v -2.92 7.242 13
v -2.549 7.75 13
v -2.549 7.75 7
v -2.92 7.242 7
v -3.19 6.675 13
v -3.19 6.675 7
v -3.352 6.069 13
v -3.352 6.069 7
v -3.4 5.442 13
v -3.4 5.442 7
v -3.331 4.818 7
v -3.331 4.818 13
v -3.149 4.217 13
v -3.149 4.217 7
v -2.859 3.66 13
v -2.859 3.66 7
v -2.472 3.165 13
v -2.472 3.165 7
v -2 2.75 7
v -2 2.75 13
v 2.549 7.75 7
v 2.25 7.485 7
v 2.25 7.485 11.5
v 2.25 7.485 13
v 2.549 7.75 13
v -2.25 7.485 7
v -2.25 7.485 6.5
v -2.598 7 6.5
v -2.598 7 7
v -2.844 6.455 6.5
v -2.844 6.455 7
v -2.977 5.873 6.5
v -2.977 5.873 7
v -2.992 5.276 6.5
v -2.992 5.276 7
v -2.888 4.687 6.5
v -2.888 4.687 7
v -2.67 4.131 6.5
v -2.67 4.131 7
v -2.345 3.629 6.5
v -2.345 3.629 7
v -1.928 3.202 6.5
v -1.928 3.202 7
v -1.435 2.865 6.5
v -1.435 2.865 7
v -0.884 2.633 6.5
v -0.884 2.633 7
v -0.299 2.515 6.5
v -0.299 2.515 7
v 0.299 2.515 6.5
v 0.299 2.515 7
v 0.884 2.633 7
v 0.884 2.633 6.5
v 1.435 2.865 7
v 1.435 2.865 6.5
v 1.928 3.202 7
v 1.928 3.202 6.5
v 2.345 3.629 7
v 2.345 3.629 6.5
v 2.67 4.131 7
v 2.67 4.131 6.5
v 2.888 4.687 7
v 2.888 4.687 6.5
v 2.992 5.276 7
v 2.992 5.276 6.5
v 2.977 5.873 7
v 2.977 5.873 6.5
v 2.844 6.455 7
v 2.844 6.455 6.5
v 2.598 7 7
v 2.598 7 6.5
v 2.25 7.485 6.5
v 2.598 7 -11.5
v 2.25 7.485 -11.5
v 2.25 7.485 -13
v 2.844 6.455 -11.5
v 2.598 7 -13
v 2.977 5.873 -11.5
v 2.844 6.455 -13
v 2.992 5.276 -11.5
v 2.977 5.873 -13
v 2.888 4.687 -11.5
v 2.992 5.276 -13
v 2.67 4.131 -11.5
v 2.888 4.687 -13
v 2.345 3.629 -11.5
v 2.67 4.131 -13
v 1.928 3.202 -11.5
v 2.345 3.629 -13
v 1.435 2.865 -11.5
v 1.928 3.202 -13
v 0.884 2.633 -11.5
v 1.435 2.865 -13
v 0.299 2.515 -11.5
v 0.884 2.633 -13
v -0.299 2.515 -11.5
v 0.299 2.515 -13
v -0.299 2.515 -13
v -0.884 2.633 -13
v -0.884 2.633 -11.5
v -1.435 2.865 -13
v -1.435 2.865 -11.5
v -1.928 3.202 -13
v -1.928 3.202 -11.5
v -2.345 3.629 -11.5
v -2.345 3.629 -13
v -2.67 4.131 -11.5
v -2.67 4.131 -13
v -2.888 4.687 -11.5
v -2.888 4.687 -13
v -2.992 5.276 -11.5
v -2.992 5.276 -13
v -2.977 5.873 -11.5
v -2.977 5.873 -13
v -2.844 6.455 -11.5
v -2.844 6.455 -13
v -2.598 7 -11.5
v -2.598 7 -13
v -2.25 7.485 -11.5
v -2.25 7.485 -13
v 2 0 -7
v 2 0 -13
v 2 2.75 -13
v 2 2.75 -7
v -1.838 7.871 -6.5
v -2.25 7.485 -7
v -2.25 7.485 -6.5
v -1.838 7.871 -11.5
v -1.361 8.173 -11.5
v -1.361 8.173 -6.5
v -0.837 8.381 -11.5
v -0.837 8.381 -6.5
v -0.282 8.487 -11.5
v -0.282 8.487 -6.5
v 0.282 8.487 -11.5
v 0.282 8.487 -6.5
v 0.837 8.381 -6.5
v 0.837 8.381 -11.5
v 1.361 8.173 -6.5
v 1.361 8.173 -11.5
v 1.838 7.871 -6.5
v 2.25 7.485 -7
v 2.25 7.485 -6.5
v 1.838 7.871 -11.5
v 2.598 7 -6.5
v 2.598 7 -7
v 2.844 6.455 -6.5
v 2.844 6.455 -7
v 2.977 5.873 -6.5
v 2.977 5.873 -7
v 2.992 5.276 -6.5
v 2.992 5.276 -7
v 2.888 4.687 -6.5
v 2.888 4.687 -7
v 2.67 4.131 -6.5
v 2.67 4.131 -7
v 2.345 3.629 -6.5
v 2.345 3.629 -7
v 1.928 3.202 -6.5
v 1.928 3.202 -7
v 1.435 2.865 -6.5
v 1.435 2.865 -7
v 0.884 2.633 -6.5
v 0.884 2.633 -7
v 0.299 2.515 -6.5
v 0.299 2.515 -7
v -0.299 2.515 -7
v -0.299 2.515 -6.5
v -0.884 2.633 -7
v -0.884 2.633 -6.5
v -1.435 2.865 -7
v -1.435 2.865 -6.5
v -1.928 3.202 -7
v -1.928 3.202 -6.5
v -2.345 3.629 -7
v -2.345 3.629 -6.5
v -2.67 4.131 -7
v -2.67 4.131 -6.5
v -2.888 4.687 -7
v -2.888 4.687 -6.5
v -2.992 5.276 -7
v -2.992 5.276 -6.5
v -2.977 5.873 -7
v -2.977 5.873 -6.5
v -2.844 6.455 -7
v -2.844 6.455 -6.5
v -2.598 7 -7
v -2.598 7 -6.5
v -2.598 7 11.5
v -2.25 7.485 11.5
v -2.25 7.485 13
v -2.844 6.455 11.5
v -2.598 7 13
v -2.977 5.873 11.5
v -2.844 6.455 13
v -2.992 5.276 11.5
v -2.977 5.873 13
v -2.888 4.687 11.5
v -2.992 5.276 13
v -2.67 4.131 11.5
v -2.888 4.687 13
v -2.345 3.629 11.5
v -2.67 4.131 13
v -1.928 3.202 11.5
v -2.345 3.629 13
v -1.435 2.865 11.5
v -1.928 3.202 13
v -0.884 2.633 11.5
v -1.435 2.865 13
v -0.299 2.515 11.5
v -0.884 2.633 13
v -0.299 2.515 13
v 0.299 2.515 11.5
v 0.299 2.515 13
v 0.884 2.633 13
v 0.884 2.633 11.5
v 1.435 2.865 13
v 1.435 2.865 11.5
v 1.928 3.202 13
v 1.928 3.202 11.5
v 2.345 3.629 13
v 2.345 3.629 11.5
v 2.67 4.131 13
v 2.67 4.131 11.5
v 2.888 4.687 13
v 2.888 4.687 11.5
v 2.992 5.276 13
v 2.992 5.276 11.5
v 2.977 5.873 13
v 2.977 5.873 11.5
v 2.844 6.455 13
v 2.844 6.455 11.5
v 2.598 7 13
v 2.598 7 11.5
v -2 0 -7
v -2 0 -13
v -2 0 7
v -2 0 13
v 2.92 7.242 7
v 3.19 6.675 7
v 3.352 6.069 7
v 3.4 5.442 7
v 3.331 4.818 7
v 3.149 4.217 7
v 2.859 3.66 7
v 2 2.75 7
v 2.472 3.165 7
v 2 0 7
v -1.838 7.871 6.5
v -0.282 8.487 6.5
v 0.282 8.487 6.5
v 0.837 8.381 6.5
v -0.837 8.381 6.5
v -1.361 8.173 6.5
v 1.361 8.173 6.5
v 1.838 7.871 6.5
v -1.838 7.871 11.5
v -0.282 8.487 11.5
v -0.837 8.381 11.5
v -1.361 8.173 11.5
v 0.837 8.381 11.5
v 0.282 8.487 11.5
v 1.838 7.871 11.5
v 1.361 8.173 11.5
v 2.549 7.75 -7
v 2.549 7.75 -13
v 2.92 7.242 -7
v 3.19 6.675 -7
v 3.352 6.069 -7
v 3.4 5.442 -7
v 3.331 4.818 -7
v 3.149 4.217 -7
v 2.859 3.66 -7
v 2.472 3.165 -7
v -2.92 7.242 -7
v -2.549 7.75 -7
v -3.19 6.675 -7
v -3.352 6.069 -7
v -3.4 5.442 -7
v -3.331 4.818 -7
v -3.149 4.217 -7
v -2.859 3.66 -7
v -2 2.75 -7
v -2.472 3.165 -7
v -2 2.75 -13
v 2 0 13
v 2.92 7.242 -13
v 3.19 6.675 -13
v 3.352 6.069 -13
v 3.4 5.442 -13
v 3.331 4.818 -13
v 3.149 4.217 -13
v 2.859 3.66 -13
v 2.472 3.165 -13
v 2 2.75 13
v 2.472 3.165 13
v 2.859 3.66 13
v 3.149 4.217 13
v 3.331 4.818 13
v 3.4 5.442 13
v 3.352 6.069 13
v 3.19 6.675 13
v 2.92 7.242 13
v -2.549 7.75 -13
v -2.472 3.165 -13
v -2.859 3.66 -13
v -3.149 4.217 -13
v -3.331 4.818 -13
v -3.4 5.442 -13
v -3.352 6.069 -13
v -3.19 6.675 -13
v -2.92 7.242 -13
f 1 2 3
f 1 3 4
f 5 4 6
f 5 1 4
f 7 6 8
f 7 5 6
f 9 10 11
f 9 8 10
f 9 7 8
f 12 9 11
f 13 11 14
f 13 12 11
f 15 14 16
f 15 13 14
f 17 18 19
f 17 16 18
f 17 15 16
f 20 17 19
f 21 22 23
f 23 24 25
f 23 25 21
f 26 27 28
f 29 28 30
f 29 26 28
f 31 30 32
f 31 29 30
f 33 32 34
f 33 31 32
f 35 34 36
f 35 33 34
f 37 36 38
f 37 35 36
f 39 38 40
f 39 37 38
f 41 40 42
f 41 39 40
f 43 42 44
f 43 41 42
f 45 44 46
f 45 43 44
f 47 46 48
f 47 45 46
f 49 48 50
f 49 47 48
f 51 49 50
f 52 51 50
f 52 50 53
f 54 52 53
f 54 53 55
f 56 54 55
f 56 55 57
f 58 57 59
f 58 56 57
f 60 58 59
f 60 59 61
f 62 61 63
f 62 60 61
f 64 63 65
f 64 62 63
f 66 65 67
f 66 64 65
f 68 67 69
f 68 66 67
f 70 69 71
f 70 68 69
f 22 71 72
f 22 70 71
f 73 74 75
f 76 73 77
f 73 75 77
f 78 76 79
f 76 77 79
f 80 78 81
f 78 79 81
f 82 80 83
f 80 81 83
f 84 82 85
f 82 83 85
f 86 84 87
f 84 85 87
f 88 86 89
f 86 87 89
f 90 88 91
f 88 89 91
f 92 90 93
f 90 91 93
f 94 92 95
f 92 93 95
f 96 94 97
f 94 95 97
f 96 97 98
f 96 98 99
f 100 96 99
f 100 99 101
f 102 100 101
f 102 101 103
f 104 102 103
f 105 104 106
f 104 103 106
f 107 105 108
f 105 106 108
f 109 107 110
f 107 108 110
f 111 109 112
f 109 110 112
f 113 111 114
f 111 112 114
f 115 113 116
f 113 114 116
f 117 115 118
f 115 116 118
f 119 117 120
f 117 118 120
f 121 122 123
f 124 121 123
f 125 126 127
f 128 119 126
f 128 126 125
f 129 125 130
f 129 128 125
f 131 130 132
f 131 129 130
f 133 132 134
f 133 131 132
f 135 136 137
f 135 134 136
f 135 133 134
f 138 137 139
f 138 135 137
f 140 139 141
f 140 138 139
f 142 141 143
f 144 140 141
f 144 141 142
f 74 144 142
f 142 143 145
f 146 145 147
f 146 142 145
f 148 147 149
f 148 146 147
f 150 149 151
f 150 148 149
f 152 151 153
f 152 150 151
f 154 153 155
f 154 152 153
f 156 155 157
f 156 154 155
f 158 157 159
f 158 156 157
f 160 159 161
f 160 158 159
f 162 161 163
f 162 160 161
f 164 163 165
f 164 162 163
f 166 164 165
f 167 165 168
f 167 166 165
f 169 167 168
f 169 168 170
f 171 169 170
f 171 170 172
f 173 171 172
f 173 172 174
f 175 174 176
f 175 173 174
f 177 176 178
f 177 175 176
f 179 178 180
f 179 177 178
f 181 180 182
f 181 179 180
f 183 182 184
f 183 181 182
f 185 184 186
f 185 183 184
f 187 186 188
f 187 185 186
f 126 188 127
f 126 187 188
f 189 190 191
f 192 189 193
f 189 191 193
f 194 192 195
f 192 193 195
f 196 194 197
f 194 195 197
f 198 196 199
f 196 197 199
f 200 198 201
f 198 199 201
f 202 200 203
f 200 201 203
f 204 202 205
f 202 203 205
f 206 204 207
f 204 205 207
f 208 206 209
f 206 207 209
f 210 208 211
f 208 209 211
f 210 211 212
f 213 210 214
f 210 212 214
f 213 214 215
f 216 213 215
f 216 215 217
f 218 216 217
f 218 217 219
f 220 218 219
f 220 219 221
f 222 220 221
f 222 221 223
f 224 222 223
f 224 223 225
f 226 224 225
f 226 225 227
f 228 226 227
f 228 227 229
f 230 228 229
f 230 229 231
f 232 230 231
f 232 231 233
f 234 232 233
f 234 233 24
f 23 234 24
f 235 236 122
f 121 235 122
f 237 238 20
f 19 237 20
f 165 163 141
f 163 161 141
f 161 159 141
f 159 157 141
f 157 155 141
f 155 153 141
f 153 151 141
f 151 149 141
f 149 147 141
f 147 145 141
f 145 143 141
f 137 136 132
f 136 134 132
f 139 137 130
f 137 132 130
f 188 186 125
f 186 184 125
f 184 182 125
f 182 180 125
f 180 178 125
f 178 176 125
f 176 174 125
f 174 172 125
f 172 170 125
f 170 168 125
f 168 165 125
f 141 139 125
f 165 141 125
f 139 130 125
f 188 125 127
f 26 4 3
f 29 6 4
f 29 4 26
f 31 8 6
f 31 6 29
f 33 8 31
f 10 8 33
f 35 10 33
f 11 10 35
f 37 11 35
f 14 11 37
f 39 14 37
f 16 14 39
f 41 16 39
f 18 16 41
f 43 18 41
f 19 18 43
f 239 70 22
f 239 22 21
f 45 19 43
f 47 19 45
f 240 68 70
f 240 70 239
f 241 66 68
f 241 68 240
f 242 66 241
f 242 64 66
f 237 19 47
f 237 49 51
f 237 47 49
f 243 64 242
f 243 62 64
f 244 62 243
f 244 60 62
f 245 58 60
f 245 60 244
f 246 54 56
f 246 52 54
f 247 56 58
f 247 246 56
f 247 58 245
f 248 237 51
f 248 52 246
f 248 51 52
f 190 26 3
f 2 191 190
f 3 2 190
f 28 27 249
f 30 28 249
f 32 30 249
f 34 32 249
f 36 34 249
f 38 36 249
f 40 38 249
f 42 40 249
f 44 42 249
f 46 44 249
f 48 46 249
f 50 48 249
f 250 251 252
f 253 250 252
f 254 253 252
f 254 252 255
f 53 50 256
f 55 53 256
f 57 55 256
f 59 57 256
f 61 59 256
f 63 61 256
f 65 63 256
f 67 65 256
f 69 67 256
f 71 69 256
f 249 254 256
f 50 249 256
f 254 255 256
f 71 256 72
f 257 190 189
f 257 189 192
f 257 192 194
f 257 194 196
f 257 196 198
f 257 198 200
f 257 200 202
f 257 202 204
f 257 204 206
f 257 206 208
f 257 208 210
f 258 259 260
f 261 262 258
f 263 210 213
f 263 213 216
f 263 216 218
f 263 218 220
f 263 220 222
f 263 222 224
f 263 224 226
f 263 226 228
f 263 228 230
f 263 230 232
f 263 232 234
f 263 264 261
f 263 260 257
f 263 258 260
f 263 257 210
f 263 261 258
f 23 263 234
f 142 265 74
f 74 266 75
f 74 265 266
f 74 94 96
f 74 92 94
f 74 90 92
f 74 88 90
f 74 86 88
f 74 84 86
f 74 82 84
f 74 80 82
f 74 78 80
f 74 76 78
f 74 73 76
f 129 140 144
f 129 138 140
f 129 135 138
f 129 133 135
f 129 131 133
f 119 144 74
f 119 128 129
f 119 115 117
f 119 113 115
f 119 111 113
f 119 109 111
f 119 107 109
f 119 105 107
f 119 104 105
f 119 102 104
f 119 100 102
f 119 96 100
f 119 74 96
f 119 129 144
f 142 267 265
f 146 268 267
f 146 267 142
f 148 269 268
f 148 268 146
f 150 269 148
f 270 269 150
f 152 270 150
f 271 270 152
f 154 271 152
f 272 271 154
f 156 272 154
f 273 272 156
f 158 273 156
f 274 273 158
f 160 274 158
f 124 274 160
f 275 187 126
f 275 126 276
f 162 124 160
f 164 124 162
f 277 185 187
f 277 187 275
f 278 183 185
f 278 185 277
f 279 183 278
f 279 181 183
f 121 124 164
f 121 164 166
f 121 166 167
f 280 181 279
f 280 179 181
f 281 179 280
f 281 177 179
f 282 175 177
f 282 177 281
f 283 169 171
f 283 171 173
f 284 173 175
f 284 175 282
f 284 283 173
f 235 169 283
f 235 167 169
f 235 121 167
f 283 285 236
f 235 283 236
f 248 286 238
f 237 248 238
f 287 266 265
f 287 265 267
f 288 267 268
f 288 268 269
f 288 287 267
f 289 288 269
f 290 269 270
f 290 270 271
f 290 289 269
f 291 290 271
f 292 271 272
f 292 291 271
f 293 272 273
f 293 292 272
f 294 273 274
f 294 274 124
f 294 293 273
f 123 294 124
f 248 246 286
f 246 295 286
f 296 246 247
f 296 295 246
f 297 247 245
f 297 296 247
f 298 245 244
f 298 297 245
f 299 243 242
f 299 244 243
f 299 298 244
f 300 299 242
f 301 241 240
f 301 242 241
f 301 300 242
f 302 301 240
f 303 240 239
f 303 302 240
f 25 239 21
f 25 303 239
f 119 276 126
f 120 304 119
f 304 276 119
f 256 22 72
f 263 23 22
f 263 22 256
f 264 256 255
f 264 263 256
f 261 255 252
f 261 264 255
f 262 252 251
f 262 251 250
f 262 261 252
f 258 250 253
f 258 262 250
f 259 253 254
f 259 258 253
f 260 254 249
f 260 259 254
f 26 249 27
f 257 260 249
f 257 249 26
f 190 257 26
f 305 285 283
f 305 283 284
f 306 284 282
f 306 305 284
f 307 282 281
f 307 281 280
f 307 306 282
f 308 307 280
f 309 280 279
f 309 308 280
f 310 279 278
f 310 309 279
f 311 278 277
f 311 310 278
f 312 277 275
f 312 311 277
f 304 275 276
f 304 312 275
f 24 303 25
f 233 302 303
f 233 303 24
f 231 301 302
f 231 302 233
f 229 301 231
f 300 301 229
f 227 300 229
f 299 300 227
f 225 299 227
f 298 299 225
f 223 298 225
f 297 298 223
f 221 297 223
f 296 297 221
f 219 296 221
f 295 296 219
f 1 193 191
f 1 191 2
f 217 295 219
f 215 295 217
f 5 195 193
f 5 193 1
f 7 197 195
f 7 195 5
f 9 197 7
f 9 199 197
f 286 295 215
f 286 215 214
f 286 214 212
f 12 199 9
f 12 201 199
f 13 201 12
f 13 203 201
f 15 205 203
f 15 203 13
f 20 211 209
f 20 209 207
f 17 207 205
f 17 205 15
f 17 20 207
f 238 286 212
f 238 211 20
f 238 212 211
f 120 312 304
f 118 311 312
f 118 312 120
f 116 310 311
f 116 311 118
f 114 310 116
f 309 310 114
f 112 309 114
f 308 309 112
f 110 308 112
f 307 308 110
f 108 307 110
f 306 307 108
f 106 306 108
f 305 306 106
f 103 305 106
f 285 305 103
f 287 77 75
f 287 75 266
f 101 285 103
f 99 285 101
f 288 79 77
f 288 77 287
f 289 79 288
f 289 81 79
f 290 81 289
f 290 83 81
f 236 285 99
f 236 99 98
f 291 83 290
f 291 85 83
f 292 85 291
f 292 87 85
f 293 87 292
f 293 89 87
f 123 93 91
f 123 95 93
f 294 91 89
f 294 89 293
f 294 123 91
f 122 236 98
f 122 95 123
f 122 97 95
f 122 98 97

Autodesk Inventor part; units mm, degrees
ref_plane "YZ Plane" through (0, 0, 0) normal (1, 0, 0) x (0, 1, 0)
ref_plane "XZ Plane" through (0, 0, 0) normal (0, 1, 0) x (-1, 0, 0)
sketch "スケッチ1" plane through (0, 0, 0) normal (0, 1, 0) x (-1, 0, 0)
  line L0 (3.4, 7) -> (-3.4, 7)
  line L1 (-3.4, 7) -> (-3.4, 13)
  line L2 (-3.4, 13) -> (3.4, 13)
  line L3 (3.4, 13) -> (3.4, 7)
  point P0 (0, 0)
  point P1 (0, 7)
  dimension "d0" = 7
  dimension "d1" = 13
  dimension "d2" = 6.8
extrude "押し出し1" add sketch "スケッチ1" along normal blind 8.5
sketch "スケッチ2" plane through (-3.4, 0, 13) normal (0, 0, 1) x (1, 0, 0)
  circle A0 centre (3.4, 5.5) radius 3
  line L0 (0, 0) -> (6.8, 0) projected
  line L1 (0, 8.5) -> (6.8, 8.5) projected
  circle A1 centre (3.4, 5.5) radius 3.4
  line L2 (6.8, 0) -> (6.8, 8.5) projected
  line L3 (3.4, 5.5) -> (0, 8.5)
  line L4 (3.4, 5.5) -> (6.8, 8.5)
  line L5 (1.4, 2.7505) -> (5.4, 2.7505)
  line L6 (5.4, 2.7505) -> (5.4, 0)
  line L7 (5.4, 0) -> (1.4, 0)
  line L8 (1.4, 0) -> (1.4, 2.7505)
  line L9 (0, 0) -> (0, 8.5) projected
  point P0 (3.4, 0)
  point P1 (3.4, 0)
  point P2 (3.4, 2.7505)
  point P3 (3.4, 0)
  point P4 (0, 5.5)
  point P5 (0.8506, 7.7495)
  point P6 (1.1505, 7.4849)
  point P7 (5.6495, 7.4849)
  point P8 (5.9494, 7.7495)
  point P9 (6.8, 5.5)
  point P10 (5.4, 2.7505)
  dimension "d5" = 6
  dimension "d6" = 4
extrude "押し出し2" cut sketch "スケッチ2" against normal up to surface (6 mm away) contours A0 L5 L3 L4 | L4 L3 A0 | A0 L1 A1 L4 | A0 L5 | A0 L3 A1 L1 | L4 L2 A1 | A1 L1 L4 | A1 L2 L0 L6 | A1 L3 L1 | L8 L0 L9 A1 | A1 L9 L3
ref_plane "作業平面1" through (-2, 0, 11.5) normal (0, 0, 1) x (1, 0, 0)
sketch "スケッチ5" plane through (-2, 0, 11.5) normal (0, 0, 1) x (1, 0, 0)
  arc A0 (-0.2495, 7.4849) -> (4.2495, 7.4849) centre (2, 5.5) ccw projected
  circle A1 centre (2, 5.5) radius 3
  point P0 (2, 0)
  point P1 (-0.2495, 7.4849)
extrude "押し出し5" add sketch "スケッチ5" against normal blind 5
mirror "ミラー1" about plane through (0, 0, 0) normal (0, 0, 1)
properties part number "fuse_cover" material "アルミニウム 6061"
